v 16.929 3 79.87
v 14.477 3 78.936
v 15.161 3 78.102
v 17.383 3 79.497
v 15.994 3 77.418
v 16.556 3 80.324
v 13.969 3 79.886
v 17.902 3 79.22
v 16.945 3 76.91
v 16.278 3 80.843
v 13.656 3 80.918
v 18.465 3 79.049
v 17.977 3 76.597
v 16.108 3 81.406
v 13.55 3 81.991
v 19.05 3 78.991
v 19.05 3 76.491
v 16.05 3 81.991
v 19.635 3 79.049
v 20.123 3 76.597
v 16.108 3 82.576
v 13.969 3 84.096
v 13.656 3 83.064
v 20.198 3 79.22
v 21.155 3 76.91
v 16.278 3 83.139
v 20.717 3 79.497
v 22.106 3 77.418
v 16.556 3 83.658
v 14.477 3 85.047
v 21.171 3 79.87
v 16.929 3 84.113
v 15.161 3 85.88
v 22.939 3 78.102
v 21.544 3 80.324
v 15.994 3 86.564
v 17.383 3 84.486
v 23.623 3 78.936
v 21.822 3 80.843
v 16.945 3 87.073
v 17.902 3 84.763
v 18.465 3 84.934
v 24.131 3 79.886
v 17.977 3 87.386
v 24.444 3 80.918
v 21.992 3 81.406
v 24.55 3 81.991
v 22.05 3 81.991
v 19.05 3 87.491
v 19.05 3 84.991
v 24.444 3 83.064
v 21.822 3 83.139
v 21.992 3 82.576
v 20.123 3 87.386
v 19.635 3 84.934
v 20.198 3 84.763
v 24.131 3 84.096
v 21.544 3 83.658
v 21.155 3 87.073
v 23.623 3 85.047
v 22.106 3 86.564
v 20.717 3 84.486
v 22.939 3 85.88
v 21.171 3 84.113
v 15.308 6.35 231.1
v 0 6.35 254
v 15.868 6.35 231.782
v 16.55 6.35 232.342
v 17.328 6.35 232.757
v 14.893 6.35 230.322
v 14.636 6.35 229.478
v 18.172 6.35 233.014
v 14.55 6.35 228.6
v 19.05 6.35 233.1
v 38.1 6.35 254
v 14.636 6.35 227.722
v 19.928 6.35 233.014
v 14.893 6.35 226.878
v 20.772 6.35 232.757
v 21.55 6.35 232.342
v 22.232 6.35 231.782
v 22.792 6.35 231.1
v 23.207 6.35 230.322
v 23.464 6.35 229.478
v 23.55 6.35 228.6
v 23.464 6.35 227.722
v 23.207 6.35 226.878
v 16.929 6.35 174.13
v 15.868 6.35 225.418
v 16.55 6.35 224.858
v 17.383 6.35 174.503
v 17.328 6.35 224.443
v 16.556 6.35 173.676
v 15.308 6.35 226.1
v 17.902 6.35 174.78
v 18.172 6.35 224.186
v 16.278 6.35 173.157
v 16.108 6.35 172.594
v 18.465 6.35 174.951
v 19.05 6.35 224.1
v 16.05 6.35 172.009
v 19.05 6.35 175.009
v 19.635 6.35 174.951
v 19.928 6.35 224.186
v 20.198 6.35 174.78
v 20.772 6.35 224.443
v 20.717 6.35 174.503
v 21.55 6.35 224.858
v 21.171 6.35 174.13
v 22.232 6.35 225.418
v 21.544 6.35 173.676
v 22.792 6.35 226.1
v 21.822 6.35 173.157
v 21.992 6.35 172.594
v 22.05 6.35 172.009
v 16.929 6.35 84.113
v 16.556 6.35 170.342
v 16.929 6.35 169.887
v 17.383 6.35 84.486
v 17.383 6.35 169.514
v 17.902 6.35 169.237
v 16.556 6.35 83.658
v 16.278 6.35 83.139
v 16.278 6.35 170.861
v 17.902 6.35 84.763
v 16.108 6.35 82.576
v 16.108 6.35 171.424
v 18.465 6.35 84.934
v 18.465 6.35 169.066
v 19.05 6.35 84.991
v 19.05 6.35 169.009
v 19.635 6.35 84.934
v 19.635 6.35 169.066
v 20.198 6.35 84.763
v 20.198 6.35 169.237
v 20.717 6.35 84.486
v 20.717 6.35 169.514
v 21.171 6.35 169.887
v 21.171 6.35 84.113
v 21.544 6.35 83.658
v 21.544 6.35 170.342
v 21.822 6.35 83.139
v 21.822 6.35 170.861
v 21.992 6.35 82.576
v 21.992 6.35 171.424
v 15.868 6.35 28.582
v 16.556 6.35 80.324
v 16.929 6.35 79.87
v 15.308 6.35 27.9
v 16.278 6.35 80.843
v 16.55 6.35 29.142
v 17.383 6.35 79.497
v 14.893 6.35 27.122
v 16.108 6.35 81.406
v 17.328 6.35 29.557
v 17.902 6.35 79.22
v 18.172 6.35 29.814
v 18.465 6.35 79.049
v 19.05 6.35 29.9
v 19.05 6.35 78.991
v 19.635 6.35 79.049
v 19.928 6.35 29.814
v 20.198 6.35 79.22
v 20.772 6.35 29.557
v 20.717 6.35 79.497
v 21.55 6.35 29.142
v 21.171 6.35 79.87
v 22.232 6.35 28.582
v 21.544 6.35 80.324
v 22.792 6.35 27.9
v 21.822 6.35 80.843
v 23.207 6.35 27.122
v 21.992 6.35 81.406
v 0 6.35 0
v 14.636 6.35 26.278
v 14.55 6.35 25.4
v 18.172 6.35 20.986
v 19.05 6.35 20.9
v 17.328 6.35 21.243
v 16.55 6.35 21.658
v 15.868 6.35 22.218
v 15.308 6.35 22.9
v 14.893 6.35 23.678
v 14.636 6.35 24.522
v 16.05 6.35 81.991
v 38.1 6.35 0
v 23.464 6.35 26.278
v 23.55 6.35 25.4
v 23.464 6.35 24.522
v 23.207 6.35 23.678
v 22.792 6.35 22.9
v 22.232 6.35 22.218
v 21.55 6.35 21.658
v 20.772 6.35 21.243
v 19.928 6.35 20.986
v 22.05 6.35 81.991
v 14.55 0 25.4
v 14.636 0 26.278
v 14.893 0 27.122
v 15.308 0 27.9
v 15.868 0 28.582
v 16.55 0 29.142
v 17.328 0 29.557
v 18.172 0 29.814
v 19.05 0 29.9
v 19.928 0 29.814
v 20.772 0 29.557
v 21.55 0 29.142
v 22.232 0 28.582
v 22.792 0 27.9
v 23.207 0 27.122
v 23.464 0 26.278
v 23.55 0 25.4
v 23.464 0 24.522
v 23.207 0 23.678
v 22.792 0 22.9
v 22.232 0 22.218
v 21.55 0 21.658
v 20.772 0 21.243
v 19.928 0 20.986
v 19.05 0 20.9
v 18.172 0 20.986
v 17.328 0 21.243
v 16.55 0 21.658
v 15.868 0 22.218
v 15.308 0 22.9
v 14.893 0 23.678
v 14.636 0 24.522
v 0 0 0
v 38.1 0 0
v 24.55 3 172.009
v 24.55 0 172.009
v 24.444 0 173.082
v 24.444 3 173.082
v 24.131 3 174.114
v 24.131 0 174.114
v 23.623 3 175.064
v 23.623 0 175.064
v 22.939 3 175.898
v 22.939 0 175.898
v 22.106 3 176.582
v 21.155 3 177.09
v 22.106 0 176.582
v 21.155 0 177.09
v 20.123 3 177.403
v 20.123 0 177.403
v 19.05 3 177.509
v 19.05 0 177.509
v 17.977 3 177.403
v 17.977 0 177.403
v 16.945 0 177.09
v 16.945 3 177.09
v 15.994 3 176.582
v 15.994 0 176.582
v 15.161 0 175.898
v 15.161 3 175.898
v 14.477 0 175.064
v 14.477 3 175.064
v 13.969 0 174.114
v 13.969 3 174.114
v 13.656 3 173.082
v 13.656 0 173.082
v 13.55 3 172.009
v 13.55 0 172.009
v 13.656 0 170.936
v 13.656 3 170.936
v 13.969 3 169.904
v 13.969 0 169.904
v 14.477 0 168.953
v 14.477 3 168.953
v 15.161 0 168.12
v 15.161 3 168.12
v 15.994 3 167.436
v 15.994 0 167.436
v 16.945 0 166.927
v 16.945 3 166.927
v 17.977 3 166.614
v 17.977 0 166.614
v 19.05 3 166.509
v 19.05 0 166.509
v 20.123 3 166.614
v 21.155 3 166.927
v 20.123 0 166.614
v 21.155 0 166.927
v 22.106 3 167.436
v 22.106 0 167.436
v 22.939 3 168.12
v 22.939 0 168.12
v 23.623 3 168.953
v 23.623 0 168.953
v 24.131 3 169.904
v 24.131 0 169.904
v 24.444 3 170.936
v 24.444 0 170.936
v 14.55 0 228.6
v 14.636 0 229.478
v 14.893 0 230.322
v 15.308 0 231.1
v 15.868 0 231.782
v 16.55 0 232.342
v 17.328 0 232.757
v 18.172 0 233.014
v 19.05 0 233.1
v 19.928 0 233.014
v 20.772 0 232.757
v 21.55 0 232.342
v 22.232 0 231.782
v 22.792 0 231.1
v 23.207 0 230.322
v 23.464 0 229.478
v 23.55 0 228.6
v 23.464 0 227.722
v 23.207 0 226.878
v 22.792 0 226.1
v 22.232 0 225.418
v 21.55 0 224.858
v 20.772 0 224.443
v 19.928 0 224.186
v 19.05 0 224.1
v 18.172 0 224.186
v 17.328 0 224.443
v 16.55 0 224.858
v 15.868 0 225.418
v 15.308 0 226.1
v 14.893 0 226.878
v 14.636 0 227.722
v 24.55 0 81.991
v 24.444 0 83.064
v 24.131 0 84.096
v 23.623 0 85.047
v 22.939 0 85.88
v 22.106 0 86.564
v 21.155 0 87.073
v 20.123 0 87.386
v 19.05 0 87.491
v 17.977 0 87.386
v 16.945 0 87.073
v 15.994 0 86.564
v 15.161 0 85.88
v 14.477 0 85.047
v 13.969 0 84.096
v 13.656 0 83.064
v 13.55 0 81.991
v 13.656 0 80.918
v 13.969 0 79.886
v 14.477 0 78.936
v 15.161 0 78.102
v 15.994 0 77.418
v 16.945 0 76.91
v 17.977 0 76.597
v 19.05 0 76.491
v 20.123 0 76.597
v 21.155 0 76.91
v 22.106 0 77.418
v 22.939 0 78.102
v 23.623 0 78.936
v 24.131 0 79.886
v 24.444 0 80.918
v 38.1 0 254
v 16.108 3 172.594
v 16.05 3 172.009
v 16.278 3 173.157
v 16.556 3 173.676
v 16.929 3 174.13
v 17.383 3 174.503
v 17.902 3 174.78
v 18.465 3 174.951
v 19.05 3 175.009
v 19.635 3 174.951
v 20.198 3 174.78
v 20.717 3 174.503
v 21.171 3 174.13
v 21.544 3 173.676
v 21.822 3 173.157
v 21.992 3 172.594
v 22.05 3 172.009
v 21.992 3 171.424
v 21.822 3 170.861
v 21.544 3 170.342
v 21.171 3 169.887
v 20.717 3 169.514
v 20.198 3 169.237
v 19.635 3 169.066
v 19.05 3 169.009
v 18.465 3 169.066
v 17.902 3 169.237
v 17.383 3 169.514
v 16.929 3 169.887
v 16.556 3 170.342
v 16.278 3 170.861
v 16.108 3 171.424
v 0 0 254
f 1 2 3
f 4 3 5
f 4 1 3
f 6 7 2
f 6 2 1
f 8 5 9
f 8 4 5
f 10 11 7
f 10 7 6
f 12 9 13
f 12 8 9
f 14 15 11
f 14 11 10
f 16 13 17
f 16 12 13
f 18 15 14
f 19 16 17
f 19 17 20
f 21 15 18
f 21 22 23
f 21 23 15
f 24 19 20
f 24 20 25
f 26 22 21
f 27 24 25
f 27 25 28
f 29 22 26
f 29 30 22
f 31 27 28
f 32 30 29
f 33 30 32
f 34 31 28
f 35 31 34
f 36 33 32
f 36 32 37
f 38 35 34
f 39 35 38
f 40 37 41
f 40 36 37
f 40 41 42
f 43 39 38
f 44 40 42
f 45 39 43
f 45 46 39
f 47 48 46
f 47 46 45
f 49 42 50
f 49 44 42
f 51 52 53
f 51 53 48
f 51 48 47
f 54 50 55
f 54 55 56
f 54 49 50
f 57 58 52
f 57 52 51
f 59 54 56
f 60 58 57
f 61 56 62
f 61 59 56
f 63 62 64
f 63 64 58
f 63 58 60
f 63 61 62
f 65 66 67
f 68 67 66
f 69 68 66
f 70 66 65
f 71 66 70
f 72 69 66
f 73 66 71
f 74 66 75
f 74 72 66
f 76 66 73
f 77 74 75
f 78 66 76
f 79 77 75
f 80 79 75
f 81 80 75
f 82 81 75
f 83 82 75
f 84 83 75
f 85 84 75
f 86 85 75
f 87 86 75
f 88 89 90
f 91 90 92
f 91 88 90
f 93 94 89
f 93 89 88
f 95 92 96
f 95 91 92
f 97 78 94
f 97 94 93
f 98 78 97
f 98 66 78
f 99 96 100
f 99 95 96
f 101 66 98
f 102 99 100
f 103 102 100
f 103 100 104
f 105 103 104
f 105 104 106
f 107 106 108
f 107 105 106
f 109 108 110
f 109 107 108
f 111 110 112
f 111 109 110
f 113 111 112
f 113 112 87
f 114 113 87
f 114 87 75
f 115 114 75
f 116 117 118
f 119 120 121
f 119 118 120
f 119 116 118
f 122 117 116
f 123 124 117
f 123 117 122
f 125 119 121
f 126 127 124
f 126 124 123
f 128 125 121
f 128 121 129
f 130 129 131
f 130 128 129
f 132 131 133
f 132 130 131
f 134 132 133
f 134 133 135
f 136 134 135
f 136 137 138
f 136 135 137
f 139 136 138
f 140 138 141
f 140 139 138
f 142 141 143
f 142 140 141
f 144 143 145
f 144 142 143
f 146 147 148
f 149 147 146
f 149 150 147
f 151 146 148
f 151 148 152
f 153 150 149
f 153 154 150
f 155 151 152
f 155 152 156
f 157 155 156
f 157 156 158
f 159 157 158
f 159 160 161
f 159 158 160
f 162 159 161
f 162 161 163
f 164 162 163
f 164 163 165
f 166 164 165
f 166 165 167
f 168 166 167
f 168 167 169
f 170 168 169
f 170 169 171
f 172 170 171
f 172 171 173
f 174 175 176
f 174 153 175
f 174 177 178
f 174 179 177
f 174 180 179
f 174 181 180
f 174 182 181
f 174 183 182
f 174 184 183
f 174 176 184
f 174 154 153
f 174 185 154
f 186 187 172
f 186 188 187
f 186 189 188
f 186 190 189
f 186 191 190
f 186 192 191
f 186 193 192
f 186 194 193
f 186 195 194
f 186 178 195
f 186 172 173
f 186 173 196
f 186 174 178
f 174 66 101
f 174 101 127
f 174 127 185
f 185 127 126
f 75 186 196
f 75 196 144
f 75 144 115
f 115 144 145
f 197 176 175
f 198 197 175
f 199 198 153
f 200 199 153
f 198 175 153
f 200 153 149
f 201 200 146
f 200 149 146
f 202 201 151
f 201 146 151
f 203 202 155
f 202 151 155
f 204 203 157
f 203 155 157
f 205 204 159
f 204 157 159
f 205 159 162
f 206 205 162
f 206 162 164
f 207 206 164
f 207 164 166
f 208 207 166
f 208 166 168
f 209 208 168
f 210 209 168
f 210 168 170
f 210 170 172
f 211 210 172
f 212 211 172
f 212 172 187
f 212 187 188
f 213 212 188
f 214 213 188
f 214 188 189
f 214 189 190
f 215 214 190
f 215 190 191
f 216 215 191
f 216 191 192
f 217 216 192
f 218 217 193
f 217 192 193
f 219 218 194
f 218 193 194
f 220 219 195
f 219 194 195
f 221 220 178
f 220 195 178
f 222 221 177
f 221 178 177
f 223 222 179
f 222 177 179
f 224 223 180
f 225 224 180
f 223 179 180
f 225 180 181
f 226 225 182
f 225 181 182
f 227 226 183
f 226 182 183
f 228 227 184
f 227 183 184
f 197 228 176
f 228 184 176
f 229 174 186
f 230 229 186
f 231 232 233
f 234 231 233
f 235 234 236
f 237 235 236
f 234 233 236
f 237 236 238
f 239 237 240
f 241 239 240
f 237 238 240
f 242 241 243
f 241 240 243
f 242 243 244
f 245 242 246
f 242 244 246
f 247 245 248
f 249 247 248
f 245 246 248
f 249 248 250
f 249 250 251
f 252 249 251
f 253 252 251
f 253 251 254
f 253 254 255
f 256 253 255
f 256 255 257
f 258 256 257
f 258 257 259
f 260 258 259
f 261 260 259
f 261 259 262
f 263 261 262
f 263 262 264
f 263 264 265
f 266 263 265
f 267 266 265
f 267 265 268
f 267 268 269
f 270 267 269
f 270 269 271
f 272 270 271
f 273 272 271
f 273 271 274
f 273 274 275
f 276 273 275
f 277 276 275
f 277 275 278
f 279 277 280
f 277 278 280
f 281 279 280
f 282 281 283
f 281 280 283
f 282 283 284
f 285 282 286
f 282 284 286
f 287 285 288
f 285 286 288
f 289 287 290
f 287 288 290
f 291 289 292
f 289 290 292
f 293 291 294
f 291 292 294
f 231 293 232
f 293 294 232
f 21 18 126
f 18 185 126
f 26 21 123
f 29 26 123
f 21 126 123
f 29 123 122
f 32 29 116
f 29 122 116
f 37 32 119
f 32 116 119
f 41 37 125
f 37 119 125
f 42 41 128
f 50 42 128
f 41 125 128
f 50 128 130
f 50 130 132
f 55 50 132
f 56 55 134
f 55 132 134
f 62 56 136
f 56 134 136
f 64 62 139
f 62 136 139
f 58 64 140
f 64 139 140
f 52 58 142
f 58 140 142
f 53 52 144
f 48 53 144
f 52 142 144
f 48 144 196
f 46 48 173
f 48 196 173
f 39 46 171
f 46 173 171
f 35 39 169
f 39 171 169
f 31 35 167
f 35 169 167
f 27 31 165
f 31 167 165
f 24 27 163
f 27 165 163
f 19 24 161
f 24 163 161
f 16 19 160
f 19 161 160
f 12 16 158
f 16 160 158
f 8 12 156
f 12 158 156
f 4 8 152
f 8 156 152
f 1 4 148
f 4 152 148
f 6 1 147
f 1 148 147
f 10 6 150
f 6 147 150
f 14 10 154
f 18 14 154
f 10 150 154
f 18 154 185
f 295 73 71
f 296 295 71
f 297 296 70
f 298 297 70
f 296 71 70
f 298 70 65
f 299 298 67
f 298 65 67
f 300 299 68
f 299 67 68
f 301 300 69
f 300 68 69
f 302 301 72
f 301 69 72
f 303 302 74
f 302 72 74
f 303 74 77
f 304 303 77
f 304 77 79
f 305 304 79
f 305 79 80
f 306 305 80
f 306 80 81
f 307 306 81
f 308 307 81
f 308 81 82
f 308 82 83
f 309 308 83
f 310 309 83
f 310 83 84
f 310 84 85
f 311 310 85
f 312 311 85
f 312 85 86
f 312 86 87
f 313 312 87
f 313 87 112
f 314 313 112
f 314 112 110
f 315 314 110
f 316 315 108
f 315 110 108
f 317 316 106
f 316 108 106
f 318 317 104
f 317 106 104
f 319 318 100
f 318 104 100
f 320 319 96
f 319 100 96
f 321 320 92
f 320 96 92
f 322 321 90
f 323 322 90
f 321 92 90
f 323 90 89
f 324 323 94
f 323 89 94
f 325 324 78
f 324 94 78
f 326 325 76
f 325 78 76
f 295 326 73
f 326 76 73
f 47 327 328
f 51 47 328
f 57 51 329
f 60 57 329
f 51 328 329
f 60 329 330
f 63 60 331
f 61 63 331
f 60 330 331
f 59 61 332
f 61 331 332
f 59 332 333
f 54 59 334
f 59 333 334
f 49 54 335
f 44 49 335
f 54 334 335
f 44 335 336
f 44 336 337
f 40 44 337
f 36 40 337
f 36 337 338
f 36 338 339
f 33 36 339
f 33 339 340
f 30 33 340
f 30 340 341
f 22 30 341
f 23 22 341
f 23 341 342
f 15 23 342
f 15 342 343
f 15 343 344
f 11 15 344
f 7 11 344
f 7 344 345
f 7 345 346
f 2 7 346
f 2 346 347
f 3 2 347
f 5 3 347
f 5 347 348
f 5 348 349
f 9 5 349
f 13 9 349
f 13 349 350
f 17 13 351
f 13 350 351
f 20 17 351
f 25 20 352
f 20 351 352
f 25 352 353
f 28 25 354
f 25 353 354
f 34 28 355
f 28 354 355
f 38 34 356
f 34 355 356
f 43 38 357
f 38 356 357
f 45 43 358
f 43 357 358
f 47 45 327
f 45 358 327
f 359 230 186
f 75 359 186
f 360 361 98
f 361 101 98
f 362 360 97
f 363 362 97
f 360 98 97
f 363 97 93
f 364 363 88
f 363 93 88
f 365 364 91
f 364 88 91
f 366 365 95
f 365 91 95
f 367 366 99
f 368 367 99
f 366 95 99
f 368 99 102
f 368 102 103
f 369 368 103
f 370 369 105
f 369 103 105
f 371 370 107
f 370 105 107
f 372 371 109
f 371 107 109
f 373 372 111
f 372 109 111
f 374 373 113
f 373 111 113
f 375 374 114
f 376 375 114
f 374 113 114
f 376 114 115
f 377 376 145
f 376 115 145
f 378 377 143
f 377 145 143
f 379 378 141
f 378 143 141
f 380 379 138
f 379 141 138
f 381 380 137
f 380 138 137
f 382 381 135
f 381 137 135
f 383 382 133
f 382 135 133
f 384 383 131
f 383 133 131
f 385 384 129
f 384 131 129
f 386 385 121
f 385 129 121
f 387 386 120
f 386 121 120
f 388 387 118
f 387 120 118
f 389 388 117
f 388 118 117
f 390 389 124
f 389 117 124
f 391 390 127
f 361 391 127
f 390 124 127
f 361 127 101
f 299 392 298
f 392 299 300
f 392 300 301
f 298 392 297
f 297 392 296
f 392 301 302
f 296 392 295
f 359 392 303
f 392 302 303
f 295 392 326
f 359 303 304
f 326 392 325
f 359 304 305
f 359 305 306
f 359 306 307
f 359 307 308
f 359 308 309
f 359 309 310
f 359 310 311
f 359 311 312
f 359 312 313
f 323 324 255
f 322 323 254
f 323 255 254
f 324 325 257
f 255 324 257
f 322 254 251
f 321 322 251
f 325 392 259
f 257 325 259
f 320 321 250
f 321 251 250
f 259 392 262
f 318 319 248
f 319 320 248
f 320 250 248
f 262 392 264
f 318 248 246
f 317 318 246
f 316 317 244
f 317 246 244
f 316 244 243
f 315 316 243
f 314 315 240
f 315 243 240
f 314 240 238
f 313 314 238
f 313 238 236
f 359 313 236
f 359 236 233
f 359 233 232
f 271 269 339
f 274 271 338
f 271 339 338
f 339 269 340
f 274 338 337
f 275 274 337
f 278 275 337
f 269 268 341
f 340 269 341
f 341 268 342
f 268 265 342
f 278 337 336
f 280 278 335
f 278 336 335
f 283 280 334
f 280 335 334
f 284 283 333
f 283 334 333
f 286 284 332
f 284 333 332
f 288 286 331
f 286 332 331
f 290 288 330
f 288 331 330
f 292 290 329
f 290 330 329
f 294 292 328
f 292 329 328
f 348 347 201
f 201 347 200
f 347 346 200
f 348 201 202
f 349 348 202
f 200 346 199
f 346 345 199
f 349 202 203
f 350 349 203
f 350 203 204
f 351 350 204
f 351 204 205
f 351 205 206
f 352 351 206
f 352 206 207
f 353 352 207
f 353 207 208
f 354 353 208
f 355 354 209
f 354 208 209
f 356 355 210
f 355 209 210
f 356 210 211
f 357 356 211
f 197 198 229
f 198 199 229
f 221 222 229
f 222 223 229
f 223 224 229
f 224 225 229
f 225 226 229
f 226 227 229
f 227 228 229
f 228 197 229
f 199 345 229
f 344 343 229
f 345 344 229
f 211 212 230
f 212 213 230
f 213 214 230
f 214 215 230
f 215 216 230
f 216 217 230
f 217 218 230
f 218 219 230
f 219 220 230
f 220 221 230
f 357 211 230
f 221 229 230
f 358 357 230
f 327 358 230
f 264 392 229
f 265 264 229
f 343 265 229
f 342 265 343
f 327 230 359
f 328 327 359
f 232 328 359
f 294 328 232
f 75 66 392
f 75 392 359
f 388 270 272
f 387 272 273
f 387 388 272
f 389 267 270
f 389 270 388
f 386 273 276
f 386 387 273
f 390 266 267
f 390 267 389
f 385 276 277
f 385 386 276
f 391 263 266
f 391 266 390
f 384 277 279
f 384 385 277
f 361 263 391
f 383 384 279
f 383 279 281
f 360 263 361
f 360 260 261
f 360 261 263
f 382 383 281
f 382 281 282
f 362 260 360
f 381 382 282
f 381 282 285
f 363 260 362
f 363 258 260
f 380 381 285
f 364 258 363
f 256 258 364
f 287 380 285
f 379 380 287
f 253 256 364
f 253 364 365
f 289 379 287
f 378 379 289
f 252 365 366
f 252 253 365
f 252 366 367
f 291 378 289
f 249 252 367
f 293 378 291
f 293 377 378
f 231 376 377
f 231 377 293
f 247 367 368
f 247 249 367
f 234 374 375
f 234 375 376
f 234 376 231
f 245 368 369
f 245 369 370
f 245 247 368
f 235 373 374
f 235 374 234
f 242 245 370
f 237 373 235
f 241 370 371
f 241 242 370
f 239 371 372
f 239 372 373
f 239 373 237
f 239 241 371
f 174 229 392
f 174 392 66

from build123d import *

# Parameters (mm, degrees)
F0_W           = 38.1
F0_H           = 6.35
F1_DEPTH       = 254
F3_D           = 9
F4_D           = 6
F4_CBORE_D     = 11
F4_CBORE_DEPTH = 3


with BuildPart() as f1:
    # F0 (on Top) → F1 (new body)
    with BuildSketch(Plane.XY):
        with Locations((19.05, 3.175)):
            Rectangle(F0_W, F0_H)
    extrude(amount=F1_DEPTH)

    # F3 (through all)
    with Locations(Plane.XZ):
        with Locations((19.05, 25.4), (19.05, 228.6)):
            Hole(F3_D / 2)

    # F4 (through all)
    with Locations(Plane.XZ):
        with Locations((19.05, 172.0088), (19.05, 81.9912)):
            CounterBoreHole(F4_D / 2, F4_CBORE_D / 2, F4_CBORE_DEPTH)


solid = f1.part
